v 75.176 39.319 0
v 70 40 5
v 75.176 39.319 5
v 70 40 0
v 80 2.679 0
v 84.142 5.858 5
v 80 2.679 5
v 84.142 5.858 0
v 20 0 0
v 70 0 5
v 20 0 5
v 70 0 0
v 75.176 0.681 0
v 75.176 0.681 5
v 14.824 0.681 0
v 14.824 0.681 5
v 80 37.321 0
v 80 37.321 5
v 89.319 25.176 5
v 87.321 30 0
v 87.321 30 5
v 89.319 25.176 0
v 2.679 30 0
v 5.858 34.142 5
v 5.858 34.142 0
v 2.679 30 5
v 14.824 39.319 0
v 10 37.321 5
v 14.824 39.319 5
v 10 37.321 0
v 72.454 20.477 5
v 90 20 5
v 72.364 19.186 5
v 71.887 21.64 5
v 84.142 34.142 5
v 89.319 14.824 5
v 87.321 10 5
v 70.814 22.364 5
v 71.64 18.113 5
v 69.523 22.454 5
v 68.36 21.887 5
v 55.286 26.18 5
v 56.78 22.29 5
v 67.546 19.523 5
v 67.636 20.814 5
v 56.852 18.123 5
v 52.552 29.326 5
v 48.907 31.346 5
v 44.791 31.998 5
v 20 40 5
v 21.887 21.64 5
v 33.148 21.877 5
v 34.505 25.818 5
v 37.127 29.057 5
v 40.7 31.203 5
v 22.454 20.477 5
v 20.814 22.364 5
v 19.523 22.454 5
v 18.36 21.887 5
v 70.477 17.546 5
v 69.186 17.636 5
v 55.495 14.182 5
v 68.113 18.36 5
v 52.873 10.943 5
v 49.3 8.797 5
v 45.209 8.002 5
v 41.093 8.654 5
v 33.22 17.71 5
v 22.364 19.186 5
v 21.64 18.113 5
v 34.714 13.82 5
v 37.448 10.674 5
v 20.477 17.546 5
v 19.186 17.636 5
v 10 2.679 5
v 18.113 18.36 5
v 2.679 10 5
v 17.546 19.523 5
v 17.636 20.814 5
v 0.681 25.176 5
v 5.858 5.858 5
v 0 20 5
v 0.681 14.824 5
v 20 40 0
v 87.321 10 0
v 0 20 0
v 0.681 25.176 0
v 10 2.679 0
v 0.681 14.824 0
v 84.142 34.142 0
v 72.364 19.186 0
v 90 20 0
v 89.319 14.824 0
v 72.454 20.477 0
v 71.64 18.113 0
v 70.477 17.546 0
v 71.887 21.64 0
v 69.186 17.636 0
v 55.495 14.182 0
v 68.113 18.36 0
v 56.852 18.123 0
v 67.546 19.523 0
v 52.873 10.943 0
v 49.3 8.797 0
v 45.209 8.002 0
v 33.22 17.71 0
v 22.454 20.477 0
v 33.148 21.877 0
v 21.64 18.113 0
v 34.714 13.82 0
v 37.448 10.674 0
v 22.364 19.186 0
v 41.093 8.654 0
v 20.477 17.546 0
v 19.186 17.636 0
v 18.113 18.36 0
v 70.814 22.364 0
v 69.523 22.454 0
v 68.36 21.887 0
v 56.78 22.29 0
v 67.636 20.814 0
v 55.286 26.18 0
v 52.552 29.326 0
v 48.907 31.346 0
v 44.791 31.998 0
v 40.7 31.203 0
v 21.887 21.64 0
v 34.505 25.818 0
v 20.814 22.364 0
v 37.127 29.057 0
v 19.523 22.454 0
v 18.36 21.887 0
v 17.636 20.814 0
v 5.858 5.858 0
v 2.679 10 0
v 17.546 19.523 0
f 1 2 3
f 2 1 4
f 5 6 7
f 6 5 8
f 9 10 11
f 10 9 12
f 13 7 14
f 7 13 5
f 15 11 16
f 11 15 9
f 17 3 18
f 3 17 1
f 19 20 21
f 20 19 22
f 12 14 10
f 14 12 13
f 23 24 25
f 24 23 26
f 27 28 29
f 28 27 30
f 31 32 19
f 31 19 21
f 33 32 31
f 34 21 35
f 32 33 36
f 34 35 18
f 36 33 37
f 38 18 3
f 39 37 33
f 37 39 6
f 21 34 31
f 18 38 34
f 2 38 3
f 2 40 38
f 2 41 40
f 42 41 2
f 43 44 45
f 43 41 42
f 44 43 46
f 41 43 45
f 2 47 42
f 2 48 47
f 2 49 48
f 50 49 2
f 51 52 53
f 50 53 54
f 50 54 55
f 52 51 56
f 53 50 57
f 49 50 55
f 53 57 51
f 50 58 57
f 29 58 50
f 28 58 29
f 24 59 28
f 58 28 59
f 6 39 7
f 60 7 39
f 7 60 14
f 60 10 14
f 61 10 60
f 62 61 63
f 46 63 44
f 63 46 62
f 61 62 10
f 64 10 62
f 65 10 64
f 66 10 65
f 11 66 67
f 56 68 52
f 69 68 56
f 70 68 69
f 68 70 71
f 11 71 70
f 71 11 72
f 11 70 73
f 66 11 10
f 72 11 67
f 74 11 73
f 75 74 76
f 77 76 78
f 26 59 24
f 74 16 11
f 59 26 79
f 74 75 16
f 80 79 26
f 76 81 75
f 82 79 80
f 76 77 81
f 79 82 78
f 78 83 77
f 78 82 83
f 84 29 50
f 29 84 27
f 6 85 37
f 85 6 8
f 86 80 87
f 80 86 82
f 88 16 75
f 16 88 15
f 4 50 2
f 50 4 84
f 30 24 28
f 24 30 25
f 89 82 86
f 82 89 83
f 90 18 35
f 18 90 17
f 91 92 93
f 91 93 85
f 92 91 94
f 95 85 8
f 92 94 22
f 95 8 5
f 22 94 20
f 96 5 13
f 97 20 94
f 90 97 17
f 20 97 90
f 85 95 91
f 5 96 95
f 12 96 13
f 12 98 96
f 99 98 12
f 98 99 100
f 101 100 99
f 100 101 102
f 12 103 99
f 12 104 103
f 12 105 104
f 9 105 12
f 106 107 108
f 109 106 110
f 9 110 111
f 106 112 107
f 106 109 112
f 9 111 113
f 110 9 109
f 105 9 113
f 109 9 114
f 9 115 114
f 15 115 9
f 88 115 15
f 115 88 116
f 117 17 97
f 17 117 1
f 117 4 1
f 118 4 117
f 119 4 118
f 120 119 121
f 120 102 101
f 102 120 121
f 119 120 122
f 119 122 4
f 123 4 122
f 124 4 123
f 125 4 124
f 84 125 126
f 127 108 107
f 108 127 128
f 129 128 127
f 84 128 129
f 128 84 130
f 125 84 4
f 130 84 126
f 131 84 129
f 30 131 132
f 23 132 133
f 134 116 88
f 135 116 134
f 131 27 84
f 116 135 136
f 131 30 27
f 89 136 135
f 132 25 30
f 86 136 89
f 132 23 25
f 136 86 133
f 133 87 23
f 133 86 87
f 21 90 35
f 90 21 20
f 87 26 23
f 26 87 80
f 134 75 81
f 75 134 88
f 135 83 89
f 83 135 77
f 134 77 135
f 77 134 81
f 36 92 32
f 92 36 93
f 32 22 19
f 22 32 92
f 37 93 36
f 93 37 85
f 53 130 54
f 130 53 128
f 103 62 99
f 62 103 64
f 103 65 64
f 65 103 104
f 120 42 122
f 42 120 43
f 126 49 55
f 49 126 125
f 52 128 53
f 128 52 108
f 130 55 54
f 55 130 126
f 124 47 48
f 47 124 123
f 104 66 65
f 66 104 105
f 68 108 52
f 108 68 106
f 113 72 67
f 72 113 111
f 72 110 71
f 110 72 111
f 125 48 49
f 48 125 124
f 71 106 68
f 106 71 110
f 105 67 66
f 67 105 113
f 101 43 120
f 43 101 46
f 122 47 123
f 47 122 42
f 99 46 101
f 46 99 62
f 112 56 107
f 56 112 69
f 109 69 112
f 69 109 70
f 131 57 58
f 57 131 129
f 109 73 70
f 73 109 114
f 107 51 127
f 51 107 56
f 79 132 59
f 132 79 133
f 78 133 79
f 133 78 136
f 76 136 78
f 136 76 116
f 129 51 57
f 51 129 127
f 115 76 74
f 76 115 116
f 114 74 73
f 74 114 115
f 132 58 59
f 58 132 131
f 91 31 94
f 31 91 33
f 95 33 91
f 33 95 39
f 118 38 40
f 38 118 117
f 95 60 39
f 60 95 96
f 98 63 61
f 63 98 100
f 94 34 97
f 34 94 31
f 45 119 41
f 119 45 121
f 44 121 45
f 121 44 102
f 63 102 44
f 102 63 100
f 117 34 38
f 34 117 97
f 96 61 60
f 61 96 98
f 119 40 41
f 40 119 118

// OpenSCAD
$fn = 32;

// ----------------------------------------------------------------------
// Spacer plate: obround span 50, caps R20
// ----------------------------------------------------------------------

// --- parameters (mm) ---
bore_r = 12;              // centre bore radius
bolt_r = 2.5;             // bolt hole radius
plate_t = 5;              // plate thickness, Z (extrusion height)
span = 50;                // obround span
cap_r = 20;               // cap radius

profile = [[20, 40], [14.824, 39.319], [10, 37.321], [5.858, 34.142], [2.679, 30], [0.681, 25.176], [0, 20], [0.681, 14.824], [2.679, 10], [5.858, 5.858], [10, 2.679], [14.824, 0.681], [20, 0], [70, 0], [75.176, 0.681], [80, 2.679], [84.142, 5.858], [87.321, 10], [89.319, 14.824], [90, 20], [89.319, 25.176], [87.321, 30], [84.142, 34.142], [80, 37.321], [75.176, 39.319], [70, 40]];  // primary outline, 26 points, counter clockwise
void_1 = [[56.78, 22.29], [55.286, 26.18], [52.552, 29.326], [48.907, 31.346], [44.791, 31.998], [40.7, 31.203], [37.127, 29.057], [34.505, 25.818], [33.148, 21.877], [33.22, 17.71], [34.714, 13.82], [37.448, 10.674], [41.093, 8.654], [45.209, 8.002], [49.3, 8.797], [52.873, 10.943], [55.495, 14.182], [56.852, 18.123]];  // centre bore, 18 points
void_2 = [[22.454, 20.477], [21.887, 21.64], [20.814, 22.364], [19.523, 22.454], [18.36, 21.887], [17.636, 20.814], [17.546, 19.523], [18.113, 18.36], [19.186, 17.636], [20.477, 17.546], [21.64, 18.113], [22.364, 19.186]];  // end hole, 12 points
void_3 = [[72.454, 20.477], [71.887, 21.64], [70.814, 22.364], [69.523, 22.454], [68.36, 21.887], [67.636, 20.814], [67.546, 19.523], [68.113, 18.36], [69.186, 17.636], [70.477, 17.546], [71.64, 18.113], [72.364, 19.186]];  // end hole, 12 points

// --- the one profile operation ---
difference() {
  linear_extrude(height = plate_t) polygon(points = profile);
  translate([0, 0, -1])
    linear_extrude(height = plate_t + 2) polygon(points = void_1);
  translate([0, 0, -1])
    linear_extrude(height = plate_t + 2) polygon(points = void_2);
  translate([0, 0, -1])
    linear_extrude(height = plate_t + 2) polygon(points = void_3);
}
